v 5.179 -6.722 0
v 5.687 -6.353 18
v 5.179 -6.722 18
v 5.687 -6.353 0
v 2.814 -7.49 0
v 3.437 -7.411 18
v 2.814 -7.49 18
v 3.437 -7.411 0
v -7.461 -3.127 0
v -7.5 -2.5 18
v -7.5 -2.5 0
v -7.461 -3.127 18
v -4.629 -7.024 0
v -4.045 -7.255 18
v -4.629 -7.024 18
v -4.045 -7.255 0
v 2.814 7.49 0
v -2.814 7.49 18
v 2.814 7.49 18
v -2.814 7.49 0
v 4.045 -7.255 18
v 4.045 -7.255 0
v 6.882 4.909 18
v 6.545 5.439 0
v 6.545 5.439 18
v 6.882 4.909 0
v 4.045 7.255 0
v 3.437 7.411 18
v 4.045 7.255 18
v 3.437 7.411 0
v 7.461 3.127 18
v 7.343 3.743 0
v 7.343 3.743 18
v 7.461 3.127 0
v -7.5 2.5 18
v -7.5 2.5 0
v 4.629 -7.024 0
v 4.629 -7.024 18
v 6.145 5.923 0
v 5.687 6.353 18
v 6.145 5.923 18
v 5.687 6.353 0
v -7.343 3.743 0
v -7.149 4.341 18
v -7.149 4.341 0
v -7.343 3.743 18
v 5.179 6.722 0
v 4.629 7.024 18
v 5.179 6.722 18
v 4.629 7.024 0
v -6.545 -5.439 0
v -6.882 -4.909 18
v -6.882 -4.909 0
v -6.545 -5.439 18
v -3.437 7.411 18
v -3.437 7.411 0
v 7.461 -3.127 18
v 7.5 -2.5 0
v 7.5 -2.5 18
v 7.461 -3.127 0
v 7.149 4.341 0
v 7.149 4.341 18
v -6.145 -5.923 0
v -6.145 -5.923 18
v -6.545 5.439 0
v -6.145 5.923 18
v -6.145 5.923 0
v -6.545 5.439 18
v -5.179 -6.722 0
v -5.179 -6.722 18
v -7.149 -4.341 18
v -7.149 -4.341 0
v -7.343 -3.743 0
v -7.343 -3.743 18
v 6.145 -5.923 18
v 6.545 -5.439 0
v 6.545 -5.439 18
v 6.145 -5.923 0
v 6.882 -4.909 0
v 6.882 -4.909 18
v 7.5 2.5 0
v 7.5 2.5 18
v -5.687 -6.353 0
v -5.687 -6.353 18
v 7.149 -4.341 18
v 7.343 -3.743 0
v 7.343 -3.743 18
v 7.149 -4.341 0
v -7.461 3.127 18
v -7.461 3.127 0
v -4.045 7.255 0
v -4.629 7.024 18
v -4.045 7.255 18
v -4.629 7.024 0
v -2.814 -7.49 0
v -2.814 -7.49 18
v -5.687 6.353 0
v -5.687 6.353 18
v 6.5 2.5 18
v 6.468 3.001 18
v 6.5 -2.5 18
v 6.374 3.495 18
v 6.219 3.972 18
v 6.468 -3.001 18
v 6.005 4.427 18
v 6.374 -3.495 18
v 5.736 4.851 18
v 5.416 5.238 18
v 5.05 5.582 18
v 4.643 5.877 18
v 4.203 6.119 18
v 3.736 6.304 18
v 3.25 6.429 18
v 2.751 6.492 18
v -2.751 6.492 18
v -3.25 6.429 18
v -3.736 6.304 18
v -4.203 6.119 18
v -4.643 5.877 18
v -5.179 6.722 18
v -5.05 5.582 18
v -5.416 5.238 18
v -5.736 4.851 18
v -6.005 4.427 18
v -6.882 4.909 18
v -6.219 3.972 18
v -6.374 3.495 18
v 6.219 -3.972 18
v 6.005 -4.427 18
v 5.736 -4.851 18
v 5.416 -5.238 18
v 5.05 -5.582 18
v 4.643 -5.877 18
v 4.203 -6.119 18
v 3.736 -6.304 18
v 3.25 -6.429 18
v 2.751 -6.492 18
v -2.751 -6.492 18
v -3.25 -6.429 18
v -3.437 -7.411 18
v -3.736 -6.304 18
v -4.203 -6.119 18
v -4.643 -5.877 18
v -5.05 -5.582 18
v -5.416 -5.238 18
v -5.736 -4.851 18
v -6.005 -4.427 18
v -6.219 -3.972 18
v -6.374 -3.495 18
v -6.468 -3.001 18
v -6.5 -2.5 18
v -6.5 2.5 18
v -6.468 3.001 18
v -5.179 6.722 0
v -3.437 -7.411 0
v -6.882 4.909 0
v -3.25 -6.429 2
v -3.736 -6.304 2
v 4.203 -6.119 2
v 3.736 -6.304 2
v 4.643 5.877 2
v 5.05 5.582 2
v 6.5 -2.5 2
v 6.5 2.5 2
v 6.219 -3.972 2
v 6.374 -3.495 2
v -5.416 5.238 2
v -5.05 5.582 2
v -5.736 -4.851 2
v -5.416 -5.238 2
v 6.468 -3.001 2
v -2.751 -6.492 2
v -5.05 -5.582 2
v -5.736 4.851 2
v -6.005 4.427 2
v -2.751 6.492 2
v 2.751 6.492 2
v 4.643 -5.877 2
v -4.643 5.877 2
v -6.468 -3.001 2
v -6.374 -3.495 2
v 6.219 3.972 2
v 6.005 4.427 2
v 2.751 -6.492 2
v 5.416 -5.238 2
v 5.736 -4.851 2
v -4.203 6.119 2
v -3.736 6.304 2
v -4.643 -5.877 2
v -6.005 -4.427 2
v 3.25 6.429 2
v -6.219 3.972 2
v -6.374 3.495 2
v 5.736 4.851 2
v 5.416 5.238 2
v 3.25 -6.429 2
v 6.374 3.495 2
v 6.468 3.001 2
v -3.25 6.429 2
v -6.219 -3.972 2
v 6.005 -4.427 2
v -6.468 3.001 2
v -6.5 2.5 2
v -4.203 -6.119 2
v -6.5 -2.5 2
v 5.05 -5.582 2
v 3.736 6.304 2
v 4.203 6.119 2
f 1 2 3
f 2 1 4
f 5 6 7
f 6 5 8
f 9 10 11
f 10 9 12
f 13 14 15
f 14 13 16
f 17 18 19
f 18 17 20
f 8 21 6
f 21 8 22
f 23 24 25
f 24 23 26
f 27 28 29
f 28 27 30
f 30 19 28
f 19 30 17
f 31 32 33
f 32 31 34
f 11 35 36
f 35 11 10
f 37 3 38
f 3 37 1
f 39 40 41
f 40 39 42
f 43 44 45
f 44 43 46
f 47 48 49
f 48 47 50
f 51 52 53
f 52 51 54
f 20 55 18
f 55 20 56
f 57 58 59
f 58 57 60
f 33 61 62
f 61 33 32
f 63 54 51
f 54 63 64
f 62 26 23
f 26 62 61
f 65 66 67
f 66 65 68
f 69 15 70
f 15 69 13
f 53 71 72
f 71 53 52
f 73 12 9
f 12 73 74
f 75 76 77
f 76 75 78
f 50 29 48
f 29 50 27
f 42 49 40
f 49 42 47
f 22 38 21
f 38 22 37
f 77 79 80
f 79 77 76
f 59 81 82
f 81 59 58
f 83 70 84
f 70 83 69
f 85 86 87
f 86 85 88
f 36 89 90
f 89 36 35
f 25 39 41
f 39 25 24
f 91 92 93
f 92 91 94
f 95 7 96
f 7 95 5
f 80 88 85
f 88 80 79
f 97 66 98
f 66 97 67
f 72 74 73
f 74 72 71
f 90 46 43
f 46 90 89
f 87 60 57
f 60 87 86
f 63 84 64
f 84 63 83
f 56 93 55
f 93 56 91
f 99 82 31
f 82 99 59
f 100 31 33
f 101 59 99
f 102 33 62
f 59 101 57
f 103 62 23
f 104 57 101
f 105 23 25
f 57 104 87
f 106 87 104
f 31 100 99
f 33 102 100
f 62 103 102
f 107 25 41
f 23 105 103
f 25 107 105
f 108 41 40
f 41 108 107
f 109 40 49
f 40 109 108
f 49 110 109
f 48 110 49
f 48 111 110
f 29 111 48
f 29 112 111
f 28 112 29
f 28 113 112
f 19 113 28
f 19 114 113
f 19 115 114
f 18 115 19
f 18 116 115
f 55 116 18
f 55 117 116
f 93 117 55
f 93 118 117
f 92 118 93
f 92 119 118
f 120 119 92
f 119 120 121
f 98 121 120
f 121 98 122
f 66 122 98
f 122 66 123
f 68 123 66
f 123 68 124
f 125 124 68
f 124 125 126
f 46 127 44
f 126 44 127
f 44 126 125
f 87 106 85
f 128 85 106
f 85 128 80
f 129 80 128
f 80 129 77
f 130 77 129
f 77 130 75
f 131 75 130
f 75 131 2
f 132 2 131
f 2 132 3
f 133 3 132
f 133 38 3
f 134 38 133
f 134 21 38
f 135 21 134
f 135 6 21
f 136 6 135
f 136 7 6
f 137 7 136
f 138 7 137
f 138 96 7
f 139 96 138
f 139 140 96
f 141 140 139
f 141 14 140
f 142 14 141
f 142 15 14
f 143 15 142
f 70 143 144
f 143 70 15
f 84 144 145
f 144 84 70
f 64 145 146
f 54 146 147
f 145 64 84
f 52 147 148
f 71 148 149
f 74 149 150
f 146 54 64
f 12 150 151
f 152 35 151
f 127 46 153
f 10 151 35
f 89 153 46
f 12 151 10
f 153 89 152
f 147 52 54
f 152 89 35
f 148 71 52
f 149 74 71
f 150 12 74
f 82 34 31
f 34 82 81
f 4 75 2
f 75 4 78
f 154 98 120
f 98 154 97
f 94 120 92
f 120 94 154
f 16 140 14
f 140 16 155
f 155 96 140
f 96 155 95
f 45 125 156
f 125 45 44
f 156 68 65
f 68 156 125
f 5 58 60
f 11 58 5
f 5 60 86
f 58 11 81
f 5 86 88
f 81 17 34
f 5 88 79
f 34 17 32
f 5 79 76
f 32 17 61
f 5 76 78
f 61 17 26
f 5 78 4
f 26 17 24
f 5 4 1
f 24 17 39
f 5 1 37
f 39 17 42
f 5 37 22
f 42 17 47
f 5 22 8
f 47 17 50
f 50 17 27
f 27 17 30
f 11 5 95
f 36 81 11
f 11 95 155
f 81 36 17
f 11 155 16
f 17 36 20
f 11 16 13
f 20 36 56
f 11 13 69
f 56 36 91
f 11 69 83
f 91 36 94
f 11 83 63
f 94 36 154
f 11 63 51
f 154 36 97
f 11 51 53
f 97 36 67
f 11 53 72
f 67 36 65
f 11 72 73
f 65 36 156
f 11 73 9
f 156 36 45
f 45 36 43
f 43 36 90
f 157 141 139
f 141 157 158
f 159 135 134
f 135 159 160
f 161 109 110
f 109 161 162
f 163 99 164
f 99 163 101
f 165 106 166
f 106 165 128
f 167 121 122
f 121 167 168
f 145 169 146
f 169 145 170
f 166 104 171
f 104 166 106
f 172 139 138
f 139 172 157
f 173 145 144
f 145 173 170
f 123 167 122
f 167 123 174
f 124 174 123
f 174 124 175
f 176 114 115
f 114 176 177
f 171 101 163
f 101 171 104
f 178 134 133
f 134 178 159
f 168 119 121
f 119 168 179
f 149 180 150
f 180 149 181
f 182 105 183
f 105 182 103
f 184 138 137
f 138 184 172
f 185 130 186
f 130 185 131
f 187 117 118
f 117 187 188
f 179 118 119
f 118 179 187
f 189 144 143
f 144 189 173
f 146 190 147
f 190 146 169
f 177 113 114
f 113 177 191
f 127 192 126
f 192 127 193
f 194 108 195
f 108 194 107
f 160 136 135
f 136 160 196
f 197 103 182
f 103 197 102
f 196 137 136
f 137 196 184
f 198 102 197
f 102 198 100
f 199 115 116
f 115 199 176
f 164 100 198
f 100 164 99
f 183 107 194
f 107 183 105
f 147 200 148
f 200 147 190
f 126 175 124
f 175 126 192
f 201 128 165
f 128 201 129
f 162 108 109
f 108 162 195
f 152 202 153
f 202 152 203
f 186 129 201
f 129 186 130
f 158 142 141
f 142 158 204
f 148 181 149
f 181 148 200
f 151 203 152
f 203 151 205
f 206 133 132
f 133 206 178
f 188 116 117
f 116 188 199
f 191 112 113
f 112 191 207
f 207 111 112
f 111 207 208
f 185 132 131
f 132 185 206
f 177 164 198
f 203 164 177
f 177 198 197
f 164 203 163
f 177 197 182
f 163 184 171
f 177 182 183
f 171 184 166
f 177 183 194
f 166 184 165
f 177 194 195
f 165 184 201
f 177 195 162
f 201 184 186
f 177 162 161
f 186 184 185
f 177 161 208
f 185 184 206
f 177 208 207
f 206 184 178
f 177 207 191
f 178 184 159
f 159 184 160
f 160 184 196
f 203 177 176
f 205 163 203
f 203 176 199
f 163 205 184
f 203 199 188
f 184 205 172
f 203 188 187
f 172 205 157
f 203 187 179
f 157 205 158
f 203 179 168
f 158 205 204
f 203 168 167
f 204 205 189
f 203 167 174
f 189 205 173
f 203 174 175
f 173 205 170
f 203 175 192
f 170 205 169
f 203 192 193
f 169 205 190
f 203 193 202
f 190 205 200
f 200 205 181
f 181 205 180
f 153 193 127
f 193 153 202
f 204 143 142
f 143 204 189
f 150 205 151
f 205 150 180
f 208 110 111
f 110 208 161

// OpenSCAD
$fn = 50;


difference() {
	union() {
		hull() {
			translate(v = [-2.5000000000, 2.5000000000, 0]) {
				cylinder(h = 18, r = 5);
			}
			translate(v = [2.5000000000, 2.5000000000, 0]) {
				cylinder(h = 18, r = 5);
			}
			translate(v = [-2.5000000000, -2.5000000000, 0]) {
				cylinder(h = 18, r = 5);
			}
			translate(v = [2.5000000000, -2.5000000000, 0]) {
				cylinder(h = 18, r = 5);
			}
		}
	}
	union() {
		translate(v = [0, 0, 2]) {
			hull() {
				translate(v = [-2.5000000000, 2.5000000000, 0]) {
					cylinder(h = 16, r = 4);
				}
				translate(v = [2.5000000000, 2.5000000000, 0]) {
					cylinder(h = 16, r = 4);
				}
				translate(v = [-2.5000000000, -2.5000000000, 0]) {
					cylinder(h = 16, r = 4);
				}
				translate(v = [2.5000000000, -2.5000000000, 0]) {
					cylinder(h = 16, r = 4);
				}
			}
		}
	}
}
